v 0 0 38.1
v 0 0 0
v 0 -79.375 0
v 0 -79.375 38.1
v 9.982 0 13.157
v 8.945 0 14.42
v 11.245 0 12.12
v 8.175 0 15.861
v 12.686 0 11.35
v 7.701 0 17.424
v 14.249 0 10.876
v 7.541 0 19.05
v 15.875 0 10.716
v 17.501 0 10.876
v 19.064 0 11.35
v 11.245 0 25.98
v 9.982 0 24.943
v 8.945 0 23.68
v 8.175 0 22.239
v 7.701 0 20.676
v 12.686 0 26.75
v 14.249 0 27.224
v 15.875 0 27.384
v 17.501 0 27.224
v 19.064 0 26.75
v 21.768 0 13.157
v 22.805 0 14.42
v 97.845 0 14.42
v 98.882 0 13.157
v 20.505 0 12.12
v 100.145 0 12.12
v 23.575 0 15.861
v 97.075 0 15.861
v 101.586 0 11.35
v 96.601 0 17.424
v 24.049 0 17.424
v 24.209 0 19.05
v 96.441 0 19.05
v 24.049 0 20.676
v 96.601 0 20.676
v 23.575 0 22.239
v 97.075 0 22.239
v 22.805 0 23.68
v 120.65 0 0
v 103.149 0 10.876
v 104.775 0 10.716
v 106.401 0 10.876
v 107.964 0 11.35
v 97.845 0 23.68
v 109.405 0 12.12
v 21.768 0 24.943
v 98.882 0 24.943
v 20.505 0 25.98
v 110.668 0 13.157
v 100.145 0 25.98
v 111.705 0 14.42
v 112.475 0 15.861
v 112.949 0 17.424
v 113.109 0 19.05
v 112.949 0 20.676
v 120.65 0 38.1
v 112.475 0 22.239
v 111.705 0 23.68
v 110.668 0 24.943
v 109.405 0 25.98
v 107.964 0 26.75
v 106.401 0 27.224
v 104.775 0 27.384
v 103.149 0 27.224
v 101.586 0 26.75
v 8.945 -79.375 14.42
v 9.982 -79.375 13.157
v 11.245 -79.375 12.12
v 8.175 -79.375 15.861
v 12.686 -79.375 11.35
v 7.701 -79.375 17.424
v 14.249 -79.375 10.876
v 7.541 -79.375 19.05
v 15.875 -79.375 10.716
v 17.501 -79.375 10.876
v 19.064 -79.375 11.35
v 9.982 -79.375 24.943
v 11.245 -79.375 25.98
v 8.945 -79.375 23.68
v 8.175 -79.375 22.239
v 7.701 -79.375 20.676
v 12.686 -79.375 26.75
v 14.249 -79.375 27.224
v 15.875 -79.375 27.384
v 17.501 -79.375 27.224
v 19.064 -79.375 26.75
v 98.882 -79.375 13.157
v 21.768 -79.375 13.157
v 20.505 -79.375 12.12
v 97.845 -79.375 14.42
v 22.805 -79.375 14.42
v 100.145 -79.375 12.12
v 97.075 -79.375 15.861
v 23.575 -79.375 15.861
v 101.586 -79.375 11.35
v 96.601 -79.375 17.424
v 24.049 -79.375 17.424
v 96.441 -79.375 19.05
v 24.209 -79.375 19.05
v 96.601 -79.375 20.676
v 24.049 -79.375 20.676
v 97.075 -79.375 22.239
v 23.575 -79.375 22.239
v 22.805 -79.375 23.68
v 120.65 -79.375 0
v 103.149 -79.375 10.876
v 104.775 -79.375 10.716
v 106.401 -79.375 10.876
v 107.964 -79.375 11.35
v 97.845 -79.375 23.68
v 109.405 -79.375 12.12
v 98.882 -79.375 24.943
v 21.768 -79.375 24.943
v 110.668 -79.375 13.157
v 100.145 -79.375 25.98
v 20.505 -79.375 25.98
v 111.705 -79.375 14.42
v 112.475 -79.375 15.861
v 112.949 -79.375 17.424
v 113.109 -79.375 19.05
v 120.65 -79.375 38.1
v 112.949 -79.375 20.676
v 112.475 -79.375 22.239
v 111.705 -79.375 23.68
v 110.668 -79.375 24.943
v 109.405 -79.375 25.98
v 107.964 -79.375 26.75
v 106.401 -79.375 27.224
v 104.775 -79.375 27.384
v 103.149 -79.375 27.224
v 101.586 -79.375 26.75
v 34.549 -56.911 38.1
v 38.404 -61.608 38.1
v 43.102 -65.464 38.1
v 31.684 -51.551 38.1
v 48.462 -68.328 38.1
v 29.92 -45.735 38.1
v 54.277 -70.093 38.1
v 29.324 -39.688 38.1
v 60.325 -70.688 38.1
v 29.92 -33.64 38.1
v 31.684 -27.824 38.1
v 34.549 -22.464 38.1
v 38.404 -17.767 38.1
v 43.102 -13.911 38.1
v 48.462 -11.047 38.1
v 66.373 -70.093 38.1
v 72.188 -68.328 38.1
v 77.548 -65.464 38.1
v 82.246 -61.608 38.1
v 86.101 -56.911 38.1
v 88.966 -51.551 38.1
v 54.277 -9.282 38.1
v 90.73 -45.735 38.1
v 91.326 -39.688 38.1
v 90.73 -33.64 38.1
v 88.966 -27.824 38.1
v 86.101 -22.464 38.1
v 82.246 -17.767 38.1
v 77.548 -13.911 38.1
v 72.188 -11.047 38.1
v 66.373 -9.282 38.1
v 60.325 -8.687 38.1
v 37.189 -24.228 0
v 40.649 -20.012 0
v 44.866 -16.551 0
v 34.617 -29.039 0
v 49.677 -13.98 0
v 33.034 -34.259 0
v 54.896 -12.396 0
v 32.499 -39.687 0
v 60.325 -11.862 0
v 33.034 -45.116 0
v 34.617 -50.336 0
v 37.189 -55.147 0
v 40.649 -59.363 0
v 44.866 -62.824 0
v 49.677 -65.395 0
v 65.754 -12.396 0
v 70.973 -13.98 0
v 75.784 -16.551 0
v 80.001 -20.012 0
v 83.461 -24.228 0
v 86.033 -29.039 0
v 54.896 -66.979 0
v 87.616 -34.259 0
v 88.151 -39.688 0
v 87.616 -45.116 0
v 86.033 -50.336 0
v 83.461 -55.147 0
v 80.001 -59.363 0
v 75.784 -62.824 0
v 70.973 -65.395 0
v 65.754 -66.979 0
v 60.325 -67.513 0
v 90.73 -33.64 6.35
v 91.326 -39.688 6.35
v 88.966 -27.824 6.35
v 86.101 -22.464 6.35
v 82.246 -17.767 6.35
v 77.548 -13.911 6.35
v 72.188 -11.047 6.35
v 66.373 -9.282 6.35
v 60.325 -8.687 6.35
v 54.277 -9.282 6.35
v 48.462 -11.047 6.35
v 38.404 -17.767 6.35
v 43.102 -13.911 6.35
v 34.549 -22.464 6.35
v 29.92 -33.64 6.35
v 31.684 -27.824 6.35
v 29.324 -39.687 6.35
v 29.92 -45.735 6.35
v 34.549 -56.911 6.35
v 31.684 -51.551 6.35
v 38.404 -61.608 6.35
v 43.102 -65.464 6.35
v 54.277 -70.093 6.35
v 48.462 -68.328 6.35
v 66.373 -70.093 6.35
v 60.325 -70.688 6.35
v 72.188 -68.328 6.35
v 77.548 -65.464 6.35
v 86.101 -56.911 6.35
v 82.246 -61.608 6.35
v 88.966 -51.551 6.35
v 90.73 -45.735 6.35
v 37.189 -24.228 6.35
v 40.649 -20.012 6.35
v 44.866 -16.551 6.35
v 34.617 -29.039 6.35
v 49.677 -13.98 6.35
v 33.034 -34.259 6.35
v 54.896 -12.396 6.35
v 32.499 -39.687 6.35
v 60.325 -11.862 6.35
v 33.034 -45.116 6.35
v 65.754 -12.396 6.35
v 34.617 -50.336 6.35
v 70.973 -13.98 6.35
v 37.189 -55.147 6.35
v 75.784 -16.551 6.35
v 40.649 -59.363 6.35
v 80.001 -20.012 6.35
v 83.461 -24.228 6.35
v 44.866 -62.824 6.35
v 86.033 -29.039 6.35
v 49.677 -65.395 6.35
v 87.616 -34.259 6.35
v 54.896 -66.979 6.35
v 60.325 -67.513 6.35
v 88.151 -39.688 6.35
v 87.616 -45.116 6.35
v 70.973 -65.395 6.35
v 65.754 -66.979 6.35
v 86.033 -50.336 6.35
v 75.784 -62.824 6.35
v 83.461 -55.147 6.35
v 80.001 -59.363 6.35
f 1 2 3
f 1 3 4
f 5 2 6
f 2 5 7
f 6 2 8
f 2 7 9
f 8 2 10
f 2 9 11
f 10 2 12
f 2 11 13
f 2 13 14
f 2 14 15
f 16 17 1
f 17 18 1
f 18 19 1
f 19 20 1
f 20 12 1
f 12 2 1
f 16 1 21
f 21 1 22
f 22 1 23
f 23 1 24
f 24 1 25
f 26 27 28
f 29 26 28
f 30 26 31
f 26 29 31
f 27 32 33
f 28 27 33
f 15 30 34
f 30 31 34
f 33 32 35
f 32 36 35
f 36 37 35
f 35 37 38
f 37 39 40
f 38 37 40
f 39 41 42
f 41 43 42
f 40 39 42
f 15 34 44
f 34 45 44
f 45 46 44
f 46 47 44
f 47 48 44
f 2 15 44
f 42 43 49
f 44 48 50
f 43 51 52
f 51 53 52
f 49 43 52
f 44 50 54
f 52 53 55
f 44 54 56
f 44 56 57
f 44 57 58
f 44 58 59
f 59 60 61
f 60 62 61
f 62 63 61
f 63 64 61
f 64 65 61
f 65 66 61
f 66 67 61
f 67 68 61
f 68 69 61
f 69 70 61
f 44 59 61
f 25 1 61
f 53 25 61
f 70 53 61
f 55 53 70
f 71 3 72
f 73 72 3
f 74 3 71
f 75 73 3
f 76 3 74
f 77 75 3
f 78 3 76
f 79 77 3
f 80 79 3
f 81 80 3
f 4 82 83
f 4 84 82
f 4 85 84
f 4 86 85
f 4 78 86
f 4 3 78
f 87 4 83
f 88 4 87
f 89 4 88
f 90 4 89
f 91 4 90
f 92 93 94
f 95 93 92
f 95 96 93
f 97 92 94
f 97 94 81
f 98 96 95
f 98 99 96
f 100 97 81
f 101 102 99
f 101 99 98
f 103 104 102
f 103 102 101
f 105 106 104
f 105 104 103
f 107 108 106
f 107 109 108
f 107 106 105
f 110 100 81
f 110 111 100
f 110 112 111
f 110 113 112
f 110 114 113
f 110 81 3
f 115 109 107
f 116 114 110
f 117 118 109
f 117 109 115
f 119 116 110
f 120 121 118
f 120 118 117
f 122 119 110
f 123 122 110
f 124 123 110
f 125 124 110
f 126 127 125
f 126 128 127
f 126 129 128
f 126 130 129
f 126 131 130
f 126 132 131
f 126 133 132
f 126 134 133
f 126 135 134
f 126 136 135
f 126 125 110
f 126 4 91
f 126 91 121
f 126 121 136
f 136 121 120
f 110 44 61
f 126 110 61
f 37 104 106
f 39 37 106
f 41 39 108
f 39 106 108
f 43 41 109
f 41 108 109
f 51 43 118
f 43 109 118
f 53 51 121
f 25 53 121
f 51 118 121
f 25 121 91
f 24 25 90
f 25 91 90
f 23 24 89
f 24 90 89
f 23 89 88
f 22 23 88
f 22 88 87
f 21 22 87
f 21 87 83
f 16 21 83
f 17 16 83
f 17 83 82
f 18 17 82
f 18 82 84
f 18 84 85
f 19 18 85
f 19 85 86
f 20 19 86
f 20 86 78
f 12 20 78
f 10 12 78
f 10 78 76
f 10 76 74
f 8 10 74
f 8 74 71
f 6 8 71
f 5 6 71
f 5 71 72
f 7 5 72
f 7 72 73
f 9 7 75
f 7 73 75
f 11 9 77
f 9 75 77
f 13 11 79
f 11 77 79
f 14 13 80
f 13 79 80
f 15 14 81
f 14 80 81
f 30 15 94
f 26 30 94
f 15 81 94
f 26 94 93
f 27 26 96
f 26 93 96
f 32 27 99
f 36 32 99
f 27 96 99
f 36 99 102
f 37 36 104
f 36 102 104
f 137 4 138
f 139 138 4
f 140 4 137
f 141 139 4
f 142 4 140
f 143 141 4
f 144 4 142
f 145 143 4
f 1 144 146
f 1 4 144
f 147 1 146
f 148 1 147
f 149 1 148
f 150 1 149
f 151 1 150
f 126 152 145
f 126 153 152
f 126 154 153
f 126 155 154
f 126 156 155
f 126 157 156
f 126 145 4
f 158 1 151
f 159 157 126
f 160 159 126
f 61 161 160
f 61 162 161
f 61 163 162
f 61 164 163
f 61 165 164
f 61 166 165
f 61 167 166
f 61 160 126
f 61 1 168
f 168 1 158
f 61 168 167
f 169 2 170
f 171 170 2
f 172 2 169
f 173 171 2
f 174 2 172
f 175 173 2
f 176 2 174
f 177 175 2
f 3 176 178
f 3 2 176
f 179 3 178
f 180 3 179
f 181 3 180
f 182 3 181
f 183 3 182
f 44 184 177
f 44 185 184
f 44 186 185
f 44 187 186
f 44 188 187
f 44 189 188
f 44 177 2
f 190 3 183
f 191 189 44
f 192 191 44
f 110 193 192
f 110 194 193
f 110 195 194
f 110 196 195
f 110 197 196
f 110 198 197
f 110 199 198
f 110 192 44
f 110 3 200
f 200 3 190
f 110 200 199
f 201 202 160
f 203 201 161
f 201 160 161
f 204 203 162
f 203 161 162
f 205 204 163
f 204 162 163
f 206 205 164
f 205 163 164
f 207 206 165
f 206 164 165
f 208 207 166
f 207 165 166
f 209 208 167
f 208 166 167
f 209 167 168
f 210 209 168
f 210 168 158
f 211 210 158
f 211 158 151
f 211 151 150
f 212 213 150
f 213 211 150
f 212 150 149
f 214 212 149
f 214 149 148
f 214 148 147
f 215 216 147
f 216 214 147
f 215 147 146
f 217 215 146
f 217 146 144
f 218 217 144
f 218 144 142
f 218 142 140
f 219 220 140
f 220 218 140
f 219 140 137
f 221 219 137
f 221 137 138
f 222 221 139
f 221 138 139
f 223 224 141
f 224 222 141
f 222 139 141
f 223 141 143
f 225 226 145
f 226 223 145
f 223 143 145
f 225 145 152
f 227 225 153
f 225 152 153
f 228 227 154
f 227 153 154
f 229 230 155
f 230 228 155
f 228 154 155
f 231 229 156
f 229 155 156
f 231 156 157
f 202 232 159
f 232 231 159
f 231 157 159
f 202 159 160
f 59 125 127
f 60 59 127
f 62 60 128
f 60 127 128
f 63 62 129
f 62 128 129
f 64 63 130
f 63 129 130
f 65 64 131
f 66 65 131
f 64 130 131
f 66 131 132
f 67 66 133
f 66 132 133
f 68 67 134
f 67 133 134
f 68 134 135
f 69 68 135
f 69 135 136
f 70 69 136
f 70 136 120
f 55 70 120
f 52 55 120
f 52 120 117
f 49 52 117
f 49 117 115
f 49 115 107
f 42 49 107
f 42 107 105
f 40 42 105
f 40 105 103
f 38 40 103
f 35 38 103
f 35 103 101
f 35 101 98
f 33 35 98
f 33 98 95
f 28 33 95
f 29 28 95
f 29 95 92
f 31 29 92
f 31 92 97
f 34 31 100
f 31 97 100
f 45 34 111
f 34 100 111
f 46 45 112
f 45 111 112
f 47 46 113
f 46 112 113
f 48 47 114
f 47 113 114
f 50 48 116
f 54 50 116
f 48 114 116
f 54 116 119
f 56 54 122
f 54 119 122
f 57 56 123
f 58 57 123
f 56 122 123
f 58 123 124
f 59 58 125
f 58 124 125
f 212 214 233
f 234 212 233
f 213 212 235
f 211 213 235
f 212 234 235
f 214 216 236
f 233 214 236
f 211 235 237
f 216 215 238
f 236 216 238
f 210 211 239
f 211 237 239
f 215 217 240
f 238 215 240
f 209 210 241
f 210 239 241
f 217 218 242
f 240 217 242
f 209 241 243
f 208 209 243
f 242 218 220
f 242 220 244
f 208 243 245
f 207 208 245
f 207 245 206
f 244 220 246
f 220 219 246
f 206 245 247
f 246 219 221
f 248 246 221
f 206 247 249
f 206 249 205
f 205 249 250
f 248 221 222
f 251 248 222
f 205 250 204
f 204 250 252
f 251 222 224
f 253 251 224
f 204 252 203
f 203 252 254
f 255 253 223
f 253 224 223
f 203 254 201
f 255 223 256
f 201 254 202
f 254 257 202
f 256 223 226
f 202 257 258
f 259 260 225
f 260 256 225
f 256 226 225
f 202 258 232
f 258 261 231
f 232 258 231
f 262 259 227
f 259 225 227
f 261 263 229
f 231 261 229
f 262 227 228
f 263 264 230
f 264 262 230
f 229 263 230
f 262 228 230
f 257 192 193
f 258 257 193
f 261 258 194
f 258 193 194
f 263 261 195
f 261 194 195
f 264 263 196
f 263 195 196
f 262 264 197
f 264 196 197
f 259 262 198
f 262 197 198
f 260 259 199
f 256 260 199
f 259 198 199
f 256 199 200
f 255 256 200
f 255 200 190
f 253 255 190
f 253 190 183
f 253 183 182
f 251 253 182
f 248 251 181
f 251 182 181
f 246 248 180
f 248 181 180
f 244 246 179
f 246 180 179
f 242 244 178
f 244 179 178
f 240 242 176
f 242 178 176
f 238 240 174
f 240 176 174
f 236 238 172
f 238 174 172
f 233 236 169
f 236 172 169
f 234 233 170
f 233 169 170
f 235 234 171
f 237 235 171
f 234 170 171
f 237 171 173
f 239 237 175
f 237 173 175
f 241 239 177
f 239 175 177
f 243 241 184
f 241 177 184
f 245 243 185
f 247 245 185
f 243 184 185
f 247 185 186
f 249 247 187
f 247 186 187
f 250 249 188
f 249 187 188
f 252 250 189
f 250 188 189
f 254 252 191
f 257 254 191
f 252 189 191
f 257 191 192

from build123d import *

# Parameters (mm, degrees)
F0_W     = 120.65
F0_H     = 38.1
F1_DEPTH = 79.375
F2_R     = 31.0007
F3_DEPTH = 38.101
F4_R     = 31.0007
F4_R_2   = 27.8257
F5_DEPTH = 6.35
F6_R     = 8.334375
F7_DEPTH = 79.376


with BuildPart() as f1:
    # F0 (on Front) → F1 (new body)
    with BuildSketch(Plane.XZ):
        with Locations((60.325, 19.05)):
            Rectangle(F0_W, F0_H)
    extrude(amount=F1_DEPTH)

    # F2 (on face) → F3 (cut, through all)
    with BuildSketch(Plane.XY.offset(38.1)):
        with Locations((60.325, -39.6875)):
            Circle(F2_R)
    extrude(amount=-F3_DEPTH, mode=Mode.SUBTRACT)

    # F4 (on face) → F5 (join)
    with BuildSketch(Plane(origin=(0, 0, 0), x_dir=(1, 0, 0), z_dir=(0, 0, -1))):
        with Locations((60.325, 39.6875)):
            Circle(F4_R)
        with Locations((60.325, 39.6875)):
            Circle(F4_R_2, mode=Mode.SUBTRACT)
    extrude(amount=-F5_DEPTH)

    # F6 (on face) → F7 (cut, through all)
    with BuildSketch(Plane.XZ.offset(79.375)):
        with Locations((15.875, 19.05)):
            Circle(F6_R)
        with Locations((104.775, 19.05)):
            Circle(F6_R)
    extrude(amount=-F7_DEPTH, mode=Mode.SUBTRACT)


solid = f1.part
